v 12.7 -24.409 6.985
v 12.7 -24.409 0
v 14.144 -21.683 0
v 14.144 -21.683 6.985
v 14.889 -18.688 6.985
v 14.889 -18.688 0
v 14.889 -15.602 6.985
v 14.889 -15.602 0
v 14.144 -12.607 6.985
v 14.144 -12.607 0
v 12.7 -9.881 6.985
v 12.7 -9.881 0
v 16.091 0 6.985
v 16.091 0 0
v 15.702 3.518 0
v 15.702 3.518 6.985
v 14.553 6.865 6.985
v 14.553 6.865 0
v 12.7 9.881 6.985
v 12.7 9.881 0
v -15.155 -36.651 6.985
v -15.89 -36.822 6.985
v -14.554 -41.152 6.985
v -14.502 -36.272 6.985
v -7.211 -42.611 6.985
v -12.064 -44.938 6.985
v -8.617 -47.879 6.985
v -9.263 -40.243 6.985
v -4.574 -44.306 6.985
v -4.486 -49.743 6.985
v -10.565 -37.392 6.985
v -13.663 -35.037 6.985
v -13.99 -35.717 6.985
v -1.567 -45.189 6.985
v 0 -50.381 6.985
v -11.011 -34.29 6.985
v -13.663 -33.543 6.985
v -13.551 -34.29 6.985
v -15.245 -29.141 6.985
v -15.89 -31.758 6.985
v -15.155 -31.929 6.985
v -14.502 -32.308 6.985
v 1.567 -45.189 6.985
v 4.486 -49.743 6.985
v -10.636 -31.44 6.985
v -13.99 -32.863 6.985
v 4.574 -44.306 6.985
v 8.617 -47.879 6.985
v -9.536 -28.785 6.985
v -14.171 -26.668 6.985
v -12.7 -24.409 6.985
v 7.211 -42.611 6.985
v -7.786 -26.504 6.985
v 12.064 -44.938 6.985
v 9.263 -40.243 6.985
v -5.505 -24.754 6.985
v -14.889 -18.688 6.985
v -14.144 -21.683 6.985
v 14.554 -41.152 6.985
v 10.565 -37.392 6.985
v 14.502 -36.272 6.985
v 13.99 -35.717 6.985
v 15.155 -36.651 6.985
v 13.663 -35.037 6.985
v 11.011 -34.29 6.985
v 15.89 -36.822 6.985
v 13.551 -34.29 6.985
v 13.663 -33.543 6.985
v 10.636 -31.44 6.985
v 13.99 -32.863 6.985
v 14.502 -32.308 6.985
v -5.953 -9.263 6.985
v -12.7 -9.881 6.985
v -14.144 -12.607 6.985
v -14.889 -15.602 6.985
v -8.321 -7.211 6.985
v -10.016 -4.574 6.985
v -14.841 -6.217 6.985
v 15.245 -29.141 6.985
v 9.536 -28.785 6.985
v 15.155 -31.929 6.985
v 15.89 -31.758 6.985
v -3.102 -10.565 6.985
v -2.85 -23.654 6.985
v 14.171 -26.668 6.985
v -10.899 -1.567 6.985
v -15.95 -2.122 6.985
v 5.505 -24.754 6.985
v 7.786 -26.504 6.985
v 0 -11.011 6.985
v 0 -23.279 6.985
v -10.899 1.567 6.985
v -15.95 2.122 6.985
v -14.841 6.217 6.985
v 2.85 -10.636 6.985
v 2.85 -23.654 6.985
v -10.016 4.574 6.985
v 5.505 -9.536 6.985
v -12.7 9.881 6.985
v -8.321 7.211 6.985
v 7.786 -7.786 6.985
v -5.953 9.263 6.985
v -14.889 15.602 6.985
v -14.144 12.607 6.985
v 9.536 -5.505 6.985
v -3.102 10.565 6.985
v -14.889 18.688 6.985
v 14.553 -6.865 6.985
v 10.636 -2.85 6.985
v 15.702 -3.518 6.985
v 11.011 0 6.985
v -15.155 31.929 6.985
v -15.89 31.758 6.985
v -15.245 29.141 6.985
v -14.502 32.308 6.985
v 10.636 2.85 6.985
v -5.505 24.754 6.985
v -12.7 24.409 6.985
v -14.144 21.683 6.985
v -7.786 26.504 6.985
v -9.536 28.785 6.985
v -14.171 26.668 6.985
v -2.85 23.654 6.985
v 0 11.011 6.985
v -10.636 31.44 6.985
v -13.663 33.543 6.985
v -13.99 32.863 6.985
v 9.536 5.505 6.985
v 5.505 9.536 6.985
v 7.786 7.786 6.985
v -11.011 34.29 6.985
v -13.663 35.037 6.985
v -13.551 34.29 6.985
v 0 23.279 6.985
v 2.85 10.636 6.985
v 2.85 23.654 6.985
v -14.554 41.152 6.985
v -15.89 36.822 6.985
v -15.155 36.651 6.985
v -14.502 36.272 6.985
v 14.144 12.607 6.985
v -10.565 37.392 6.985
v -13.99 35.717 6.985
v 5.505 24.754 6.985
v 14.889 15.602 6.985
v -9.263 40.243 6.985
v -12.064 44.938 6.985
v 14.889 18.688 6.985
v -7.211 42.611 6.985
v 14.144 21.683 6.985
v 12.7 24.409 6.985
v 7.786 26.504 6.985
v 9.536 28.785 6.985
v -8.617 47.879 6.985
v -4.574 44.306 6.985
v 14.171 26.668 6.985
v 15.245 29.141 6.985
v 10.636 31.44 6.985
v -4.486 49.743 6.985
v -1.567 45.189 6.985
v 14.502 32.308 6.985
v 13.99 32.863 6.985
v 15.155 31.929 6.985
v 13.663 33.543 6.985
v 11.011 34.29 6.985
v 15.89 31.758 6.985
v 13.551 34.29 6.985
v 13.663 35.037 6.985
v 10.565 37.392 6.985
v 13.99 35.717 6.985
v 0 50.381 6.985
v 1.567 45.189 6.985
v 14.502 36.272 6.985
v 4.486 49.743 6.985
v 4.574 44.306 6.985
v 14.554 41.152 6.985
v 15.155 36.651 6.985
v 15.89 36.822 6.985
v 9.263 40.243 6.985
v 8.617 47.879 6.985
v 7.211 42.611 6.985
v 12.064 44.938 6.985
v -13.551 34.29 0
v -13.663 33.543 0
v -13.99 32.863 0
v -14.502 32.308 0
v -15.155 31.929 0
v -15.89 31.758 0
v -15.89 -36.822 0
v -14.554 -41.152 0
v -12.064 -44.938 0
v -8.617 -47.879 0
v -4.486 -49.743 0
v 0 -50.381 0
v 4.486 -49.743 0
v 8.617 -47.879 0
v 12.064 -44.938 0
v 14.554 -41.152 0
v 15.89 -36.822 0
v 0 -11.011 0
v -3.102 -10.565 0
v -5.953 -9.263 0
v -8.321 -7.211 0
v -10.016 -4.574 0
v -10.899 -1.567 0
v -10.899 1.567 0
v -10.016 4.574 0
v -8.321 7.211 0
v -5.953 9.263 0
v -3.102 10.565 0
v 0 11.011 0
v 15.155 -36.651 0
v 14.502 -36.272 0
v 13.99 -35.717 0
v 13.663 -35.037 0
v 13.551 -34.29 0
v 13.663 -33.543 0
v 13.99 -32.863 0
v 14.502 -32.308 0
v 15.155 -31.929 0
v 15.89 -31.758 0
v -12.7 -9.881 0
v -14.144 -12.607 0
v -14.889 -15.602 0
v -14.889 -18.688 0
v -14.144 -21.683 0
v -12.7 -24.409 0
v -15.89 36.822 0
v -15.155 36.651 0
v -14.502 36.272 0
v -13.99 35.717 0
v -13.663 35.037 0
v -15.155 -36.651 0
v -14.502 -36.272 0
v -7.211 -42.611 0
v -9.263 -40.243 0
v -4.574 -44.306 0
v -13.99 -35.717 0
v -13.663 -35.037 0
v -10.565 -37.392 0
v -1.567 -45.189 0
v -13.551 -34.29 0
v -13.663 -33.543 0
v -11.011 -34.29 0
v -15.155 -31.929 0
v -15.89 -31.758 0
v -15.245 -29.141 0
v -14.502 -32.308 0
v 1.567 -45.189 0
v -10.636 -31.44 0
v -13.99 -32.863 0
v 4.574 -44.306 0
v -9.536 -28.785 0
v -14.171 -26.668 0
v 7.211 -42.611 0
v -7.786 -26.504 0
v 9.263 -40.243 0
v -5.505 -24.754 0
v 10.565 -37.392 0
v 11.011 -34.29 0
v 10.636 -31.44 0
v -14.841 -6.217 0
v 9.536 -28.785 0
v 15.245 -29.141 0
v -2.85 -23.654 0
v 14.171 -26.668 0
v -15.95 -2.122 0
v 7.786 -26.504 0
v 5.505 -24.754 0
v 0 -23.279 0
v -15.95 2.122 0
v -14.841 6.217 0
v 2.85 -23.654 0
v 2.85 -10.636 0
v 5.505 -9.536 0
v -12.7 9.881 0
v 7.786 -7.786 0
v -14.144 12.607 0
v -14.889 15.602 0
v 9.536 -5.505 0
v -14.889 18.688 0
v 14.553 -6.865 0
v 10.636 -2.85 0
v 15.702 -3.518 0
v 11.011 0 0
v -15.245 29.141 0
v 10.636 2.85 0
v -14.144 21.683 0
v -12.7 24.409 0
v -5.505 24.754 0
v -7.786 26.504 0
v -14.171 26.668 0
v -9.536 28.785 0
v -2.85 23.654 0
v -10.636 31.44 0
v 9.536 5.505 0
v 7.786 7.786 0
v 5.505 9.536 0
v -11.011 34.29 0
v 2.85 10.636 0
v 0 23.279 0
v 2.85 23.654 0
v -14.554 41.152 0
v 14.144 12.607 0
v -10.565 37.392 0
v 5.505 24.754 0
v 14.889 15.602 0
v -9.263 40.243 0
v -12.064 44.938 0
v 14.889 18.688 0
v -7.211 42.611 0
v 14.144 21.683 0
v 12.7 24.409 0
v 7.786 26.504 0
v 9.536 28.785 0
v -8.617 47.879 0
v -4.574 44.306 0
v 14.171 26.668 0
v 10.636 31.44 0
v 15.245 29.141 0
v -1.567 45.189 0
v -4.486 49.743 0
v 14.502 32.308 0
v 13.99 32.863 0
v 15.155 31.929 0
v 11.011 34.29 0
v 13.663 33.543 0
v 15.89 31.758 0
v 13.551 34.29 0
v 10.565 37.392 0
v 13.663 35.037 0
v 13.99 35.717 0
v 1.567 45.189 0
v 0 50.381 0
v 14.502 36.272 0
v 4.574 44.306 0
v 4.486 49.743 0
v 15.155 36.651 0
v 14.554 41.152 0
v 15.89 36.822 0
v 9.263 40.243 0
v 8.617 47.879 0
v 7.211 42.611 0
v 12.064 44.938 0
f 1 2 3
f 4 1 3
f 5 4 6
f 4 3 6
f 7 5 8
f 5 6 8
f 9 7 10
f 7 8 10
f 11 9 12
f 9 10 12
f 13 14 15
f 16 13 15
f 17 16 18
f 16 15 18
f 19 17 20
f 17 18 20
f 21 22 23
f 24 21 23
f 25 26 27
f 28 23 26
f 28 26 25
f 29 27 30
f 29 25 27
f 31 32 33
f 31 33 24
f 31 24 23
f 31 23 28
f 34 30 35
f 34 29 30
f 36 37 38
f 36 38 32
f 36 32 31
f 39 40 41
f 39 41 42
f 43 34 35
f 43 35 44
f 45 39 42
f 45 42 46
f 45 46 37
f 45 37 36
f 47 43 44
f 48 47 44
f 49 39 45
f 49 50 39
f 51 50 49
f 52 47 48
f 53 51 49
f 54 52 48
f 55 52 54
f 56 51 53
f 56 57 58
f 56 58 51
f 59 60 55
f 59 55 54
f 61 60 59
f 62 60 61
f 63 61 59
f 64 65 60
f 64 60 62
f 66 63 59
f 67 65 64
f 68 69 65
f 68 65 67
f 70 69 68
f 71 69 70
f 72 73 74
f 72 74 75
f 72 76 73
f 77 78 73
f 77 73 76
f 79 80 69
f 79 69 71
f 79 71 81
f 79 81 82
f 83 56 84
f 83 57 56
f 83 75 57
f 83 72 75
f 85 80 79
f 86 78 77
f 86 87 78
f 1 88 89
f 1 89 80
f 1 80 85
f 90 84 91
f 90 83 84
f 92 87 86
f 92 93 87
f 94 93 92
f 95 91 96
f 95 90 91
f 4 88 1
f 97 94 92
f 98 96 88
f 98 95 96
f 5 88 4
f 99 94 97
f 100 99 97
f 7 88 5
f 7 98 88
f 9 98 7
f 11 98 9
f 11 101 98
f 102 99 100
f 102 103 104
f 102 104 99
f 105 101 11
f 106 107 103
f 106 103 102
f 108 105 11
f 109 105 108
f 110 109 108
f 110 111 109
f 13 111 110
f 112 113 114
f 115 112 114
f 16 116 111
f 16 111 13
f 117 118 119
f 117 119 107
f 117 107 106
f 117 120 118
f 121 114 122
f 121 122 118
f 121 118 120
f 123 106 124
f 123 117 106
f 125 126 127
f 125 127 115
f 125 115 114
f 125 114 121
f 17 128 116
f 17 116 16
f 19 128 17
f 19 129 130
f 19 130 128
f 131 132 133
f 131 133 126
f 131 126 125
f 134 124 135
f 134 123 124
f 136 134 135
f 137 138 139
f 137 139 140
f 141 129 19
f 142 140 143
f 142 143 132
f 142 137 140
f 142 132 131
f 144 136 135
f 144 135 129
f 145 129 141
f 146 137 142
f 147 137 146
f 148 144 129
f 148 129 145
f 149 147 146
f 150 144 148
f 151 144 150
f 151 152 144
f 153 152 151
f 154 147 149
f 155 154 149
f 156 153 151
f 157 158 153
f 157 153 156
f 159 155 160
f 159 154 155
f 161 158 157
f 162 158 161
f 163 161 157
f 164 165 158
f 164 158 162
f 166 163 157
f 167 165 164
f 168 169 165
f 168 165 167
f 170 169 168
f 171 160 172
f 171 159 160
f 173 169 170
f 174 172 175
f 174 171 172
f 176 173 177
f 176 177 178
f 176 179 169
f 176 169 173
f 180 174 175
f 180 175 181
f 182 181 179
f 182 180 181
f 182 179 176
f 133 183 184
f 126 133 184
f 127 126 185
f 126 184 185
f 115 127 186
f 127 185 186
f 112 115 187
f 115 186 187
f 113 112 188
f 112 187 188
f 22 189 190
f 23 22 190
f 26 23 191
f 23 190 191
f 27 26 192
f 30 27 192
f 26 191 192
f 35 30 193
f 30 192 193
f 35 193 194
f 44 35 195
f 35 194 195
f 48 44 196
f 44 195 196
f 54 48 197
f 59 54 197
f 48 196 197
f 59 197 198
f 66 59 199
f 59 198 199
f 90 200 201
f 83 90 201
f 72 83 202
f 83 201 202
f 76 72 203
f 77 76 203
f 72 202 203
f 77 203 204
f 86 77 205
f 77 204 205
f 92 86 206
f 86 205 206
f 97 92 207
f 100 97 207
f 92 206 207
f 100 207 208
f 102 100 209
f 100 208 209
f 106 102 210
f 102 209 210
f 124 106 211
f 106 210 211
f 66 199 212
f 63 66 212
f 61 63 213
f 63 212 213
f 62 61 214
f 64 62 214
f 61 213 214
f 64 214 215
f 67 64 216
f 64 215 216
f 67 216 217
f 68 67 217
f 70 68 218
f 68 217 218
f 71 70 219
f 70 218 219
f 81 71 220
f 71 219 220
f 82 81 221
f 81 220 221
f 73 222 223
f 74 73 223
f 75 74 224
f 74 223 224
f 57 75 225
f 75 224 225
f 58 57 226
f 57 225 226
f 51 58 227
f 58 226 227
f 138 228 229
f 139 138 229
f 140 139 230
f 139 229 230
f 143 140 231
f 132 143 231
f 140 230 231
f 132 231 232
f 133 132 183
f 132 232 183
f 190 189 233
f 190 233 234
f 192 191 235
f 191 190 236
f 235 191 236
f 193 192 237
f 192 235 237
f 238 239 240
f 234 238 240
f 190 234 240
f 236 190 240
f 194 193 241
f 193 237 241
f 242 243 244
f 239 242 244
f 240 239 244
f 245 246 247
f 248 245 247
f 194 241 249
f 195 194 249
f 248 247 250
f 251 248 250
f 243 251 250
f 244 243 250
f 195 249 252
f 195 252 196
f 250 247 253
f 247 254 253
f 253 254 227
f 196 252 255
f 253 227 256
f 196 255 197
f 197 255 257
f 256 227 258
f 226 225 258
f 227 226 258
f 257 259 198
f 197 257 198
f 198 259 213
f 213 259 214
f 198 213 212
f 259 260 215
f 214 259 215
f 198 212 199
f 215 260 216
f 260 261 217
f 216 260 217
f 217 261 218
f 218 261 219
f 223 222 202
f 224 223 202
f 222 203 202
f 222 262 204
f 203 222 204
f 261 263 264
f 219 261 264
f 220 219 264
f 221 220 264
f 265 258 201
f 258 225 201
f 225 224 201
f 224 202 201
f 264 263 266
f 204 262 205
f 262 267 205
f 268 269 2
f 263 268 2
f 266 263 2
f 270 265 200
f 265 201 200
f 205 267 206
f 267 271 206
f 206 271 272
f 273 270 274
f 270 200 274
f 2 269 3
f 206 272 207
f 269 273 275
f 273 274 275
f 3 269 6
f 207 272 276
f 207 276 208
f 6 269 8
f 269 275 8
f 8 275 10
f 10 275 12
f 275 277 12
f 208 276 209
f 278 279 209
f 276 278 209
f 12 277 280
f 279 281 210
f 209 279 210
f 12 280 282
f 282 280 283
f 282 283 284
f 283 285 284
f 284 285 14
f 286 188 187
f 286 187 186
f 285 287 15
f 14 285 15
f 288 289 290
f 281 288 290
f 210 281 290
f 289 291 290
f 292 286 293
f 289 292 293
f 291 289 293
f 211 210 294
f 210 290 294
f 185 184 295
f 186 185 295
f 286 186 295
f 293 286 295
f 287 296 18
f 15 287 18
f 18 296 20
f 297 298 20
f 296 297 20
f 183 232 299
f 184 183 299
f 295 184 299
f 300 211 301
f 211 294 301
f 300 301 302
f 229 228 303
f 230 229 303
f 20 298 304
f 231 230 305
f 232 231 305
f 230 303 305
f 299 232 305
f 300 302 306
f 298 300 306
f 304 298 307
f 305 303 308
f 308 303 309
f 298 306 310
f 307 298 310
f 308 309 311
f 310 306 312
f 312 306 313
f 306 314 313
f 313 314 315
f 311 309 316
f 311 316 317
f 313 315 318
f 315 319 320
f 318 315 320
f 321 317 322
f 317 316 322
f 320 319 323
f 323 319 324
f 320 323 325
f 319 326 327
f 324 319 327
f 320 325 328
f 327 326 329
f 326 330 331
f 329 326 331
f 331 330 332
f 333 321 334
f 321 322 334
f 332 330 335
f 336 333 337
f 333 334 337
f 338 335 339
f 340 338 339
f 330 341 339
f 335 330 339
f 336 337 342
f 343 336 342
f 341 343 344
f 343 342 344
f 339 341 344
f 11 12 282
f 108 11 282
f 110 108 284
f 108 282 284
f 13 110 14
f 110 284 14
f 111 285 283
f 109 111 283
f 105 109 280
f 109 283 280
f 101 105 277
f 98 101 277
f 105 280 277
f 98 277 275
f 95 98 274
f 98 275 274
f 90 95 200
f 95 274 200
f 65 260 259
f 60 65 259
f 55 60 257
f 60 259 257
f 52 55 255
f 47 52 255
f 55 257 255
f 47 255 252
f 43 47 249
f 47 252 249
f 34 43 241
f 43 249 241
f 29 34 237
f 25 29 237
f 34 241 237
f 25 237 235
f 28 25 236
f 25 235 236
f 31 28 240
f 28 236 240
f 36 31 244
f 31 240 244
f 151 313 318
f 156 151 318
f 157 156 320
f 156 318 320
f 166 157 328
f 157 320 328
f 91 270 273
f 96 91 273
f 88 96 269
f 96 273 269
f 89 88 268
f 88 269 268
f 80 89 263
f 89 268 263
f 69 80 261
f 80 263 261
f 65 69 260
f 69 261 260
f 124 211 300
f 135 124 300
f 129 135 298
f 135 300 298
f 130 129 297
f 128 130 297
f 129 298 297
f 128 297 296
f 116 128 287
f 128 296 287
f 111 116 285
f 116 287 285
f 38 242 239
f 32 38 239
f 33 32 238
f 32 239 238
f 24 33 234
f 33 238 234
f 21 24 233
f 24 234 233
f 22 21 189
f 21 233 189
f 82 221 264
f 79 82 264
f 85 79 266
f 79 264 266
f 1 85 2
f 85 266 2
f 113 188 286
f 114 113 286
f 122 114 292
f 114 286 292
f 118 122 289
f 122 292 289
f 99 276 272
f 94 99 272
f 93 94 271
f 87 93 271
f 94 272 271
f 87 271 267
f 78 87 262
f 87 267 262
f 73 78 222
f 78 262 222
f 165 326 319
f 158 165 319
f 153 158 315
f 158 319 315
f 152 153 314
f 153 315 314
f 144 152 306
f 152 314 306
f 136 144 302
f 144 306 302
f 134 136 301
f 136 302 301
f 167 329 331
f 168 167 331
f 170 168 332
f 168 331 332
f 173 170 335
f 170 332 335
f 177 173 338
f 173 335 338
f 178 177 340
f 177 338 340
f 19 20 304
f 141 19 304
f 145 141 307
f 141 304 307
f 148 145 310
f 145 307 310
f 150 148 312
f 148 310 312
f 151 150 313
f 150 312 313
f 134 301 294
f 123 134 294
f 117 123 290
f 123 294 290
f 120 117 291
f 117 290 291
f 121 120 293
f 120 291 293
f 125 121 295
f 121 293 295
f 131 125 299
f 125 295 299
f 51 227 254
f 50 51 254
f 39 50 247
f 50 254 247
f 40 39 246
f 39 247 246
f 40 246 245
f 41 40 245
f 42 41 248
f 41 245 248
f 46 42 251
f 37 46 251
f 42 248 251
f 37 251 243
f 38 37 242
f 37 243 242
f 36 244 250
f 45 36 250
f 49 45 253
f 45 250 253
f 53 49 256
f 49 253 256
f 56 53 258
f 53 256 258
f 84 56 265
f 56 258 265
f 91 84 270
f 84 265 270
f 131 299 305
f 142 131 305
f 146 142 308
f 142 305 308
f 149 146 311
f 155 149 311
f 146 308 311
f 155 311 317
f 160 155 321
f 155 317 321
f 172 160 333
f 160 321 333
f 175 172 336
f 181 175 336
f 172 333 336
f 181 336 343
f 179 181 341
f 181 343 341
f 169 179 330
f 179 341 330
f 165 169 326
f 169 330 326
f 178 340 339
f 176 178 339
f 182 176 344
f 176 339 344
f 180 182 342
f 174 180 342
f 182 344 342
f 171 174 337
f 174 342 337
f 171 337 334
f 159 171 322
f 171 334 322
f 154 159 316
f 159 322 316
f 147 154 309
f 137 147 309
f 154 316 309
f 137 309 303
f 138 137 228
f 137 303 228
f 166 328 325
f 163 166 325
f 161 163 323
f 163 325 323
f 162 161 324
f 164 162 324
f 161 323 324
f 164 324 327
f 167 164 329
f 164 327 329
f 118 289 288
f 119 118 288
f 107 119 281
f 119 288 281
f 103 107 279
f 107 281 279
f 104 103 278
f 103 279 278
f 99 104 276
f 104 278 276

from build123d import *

# Parameters (mm, degrees)
F1_DEPTH = 6.985


with BuildPart() as f1:
    # F0 (on Top) → F1 (new body)
    with BuildSketch(Plane.XY):
        with BuildLine():
            Line((0, 18.1991), (0, 16.0909))
            ThreePointArc((0, 16.0909), (7.068545098, 14.4551974392), (12.7, 9.8806408097))
            ThreePointArc((12.7, 9.8806408097), (14.9827505764, 17.145), (12.7, 24.4093591903))
            ThreePointArc((12.7, 24.4093591903), (7.068545098, 19.8348025608), (0, 18.1991))
        make_face()
        with BuildLine():
            ThreePointArc((-12.7, 9.8806408097), (-7.068545098, 14.4551974392), (0, 16.0909))
            Line((0, 16.0909), (0, 18.1991))
            ThreePointArc((0, 18.1991), (-7.068545098, 19.8348025608), (-12.7, 24.4093591903))
            ThreePointArc((-12.7, 24.4093591903), (-14.9827505764, 17.145), (-12.7, 9.8806408097))
        make_face()
        with BuildLine():
            Line((0, -18.1991), (0, -16.0909))
            ThreePointArc((0, -16.0909), (-7.068545098, -14.4551974392), (-12.7, -9.8806408097))
            ThreePointArc((-12.7, -9.8806408097), (-14.9827505764, -17.145), (-12.7, -24.4093591903))
            ThreePointArc((-12.7, -24.4093591903), (-7.068545098, -19.8348025608), (0, -18.1991))
        make_face()
        with BuildLine():
            ThreePointArc((12.7, -9.8806408097), (7.068545098, -14.4551974392), (0, -16.0909))
            Line((0, -16.0909), (0, -18.1991))
            ThreePointArc((0, -18.1991), (7.068545098, -19.8348025608), (12.7, -24.4093591903))
            ThreePointArc((12.7, -24.4093591903), (14.9827505764, -17.145), (12.7, -9.8806408097))
        make_face()
        with BuildLine():
            ThreePointArc((0, -11.0109), (-11.0109, 0), (0, 11.0109))
            Line((0, 11.0109), (0, 16.0909))
            ThreePointArc((0, 16.0909), (-7.068545098, 14.4551974392), (-12.7, 9.8806408097))
            ThreePointArc((-12.7, 9.8806408097), (-16.0909, 0), (-12.7, -9.8806408097))
            ThreePointArc((-12.7, -9.8806408097), (-7.068545098, -14.4551974392), (0, -16.0909))
            Line((0, -16.0909), (0, -11.0109))
        make_face()
        with BuildLine():
            ThreePointArc((0, 11.0109), (7.785882057, 7.785882057), (11.0109, 0))
            ThreePointArc((11.0109, 0), (7.785882057, -7.785882057), (0, -11.0109))
            Line((0, -11.0109), (0, -16.0909))
            ThreePointArc((0, -16.0909), (7.068545098, -14.4551974392), (12.7, -9.8806408097))
            ThreePointArc((12.7, -9.8806408097), (15.2195843046, -5.2231519607), (16.0909, 0))
            ThreePointArc((16.0909, 0), (15.2195843046, 5.2231519607), (12.7, 9.8806408097))
            ThreePointArc((12.7, 9.8806408097), (7.068545098, 14.4551974392), (0, 16.0909))
            Line((0, 16.0909), (0, 11.0109))
        make_face()
        with BuildLine():
            Line((-13.5509, 34.29), (-11.0109, 34.29))
            ThreePointArc((-11.0109, 34.29), (0, 45.3009), (11.0109, 34.29))
            Line((11.0109, 34.29), (13.5509, 34.29))
            ThreePointArc((13.5509, 34.29), (14.2253166004, 36.013716502), (15.8904264404, 36.8220762927))
            ThreePointArc((15.8904264404, 36.8220762927), (0, 50.3809), (-15.8904264404, 36.8220762927))
            ThreePointArc((-15.8904264404, 36.8220762927), (-14.2253166004, 36.013716502), (-13.5509, 34.29))
        make_face()
        with BuildLine():
            ThreePointArc((-12.7, 24.4093591903), (-7.068545098, 19.8348025608), (0, 18.1991))
            Line((0, 18.1991), (0, 23.2791))
            ThreePointArc((0, 23.2791), (-7.785882057, 26.504117943), (-11.0109, 34.29))
            Line((-11.0109, 34.29), (-13.5509, 34.29))
            ThreePointArc((-13.5509, 34.29), (-14.2253166004, 32.566283498), (-15.8904264404, 31.7579237073))
            ThreePointArc((-15.8904264404, 31.7579237073), (-14.7598601323, 27.8819120103), (-12.7, 24.4093591903))
        make_face()
        with BuildLine():
            Line((0, 23.2791), (0, 18.1991))
            ThreePointArc((0, 18.1991), (7.068545098, 19.8348025608), (12.7, 24.4093591903))
            ThreePointArc((12.7, 24.4093591903), (14.7598601323, 27.8819120103), (15.8904264404, 31.7579237073))
            ThreePointArc((15.8904264404, 31.7579237073), (14.2253166004, 32.566283498), (13.5509, 34.29))
            Line((13.5509, 34.29), (11.0109, 34.29))
            ThreePointArc((11.0109, 34.29), (7.785882057, 26.504117943), (0, 23.2791))
        make_face()
        with BuildLine():
            ThreePointArc((12.7, -24.4093591903), (7.068545098, -19.8348025608), (0, -18.1991))
            Line((0, -18.1991), (0, -23.2791))
            ThreePointArc((0, -23.2791), (7.785882057, -26.504117943), (11.0109, -34.29))
            Line((11.0109, -34.29), (13.5509, -34.29))
            ThreePointArc((13.5509, -34.29), (14.2253166004, -32.566283498), (15.8904264404, -31.7579237073))
            ThreePointArc((15.8904264404, -31.7579237073), (14.7598601323, -27.8819120103), (12.7, -24.4093591903))
        make_face()
        with BuildLine():
            Line((0, -23.2791), (0, -18.1991))
            ThreePointArc((0, -18.1991), (-7.068545098, -19.8348025608), (-12.7, -24.4093591903))
            ThreePointArc((-12.7, -24.4093591903), (-14.7598601323, -27.8819120103), (-15.8904264404, -31.7579237073))
            ThreePointArc((-15.8904264404, -31.7579237073), (-14.2253166004, -32.566283498), (-13.5509, -34.29))
            Line((-13.5509, -34.29), (-11.0109, -34.29))
            ThreePointArc((-11.0109, -34.29), (-7.785882057, -26.504117943), (0, -23.2791))
        make_face()
        with BuildLine():
            Line((13.5509, -34.29), (11.0109, -34.29))
            ThreePointArc((11.0109, -34.29), (0, -45.3009), (-11.0109, -34.29))
            Line((-11.0109, -34.29), (-13.5509, -34.29))
            ThreePointArc((-13.5509, -34.29), (-14.2253166004, -36.013716502), (-15.8904264404, -36.8220762927))
            ThreePointArc((-15.8904264404, -36.8220762927), (0, -50.3809), (15.8904264404, -36.8220762927))
            ThreePointArc((15.8904264404, -36.8220762927), (14.2253166004, -36.013716502), (13.5509, -34.29))
        make_face()
    extrude(amount=F1_DEPTH)


solid = f1.part
